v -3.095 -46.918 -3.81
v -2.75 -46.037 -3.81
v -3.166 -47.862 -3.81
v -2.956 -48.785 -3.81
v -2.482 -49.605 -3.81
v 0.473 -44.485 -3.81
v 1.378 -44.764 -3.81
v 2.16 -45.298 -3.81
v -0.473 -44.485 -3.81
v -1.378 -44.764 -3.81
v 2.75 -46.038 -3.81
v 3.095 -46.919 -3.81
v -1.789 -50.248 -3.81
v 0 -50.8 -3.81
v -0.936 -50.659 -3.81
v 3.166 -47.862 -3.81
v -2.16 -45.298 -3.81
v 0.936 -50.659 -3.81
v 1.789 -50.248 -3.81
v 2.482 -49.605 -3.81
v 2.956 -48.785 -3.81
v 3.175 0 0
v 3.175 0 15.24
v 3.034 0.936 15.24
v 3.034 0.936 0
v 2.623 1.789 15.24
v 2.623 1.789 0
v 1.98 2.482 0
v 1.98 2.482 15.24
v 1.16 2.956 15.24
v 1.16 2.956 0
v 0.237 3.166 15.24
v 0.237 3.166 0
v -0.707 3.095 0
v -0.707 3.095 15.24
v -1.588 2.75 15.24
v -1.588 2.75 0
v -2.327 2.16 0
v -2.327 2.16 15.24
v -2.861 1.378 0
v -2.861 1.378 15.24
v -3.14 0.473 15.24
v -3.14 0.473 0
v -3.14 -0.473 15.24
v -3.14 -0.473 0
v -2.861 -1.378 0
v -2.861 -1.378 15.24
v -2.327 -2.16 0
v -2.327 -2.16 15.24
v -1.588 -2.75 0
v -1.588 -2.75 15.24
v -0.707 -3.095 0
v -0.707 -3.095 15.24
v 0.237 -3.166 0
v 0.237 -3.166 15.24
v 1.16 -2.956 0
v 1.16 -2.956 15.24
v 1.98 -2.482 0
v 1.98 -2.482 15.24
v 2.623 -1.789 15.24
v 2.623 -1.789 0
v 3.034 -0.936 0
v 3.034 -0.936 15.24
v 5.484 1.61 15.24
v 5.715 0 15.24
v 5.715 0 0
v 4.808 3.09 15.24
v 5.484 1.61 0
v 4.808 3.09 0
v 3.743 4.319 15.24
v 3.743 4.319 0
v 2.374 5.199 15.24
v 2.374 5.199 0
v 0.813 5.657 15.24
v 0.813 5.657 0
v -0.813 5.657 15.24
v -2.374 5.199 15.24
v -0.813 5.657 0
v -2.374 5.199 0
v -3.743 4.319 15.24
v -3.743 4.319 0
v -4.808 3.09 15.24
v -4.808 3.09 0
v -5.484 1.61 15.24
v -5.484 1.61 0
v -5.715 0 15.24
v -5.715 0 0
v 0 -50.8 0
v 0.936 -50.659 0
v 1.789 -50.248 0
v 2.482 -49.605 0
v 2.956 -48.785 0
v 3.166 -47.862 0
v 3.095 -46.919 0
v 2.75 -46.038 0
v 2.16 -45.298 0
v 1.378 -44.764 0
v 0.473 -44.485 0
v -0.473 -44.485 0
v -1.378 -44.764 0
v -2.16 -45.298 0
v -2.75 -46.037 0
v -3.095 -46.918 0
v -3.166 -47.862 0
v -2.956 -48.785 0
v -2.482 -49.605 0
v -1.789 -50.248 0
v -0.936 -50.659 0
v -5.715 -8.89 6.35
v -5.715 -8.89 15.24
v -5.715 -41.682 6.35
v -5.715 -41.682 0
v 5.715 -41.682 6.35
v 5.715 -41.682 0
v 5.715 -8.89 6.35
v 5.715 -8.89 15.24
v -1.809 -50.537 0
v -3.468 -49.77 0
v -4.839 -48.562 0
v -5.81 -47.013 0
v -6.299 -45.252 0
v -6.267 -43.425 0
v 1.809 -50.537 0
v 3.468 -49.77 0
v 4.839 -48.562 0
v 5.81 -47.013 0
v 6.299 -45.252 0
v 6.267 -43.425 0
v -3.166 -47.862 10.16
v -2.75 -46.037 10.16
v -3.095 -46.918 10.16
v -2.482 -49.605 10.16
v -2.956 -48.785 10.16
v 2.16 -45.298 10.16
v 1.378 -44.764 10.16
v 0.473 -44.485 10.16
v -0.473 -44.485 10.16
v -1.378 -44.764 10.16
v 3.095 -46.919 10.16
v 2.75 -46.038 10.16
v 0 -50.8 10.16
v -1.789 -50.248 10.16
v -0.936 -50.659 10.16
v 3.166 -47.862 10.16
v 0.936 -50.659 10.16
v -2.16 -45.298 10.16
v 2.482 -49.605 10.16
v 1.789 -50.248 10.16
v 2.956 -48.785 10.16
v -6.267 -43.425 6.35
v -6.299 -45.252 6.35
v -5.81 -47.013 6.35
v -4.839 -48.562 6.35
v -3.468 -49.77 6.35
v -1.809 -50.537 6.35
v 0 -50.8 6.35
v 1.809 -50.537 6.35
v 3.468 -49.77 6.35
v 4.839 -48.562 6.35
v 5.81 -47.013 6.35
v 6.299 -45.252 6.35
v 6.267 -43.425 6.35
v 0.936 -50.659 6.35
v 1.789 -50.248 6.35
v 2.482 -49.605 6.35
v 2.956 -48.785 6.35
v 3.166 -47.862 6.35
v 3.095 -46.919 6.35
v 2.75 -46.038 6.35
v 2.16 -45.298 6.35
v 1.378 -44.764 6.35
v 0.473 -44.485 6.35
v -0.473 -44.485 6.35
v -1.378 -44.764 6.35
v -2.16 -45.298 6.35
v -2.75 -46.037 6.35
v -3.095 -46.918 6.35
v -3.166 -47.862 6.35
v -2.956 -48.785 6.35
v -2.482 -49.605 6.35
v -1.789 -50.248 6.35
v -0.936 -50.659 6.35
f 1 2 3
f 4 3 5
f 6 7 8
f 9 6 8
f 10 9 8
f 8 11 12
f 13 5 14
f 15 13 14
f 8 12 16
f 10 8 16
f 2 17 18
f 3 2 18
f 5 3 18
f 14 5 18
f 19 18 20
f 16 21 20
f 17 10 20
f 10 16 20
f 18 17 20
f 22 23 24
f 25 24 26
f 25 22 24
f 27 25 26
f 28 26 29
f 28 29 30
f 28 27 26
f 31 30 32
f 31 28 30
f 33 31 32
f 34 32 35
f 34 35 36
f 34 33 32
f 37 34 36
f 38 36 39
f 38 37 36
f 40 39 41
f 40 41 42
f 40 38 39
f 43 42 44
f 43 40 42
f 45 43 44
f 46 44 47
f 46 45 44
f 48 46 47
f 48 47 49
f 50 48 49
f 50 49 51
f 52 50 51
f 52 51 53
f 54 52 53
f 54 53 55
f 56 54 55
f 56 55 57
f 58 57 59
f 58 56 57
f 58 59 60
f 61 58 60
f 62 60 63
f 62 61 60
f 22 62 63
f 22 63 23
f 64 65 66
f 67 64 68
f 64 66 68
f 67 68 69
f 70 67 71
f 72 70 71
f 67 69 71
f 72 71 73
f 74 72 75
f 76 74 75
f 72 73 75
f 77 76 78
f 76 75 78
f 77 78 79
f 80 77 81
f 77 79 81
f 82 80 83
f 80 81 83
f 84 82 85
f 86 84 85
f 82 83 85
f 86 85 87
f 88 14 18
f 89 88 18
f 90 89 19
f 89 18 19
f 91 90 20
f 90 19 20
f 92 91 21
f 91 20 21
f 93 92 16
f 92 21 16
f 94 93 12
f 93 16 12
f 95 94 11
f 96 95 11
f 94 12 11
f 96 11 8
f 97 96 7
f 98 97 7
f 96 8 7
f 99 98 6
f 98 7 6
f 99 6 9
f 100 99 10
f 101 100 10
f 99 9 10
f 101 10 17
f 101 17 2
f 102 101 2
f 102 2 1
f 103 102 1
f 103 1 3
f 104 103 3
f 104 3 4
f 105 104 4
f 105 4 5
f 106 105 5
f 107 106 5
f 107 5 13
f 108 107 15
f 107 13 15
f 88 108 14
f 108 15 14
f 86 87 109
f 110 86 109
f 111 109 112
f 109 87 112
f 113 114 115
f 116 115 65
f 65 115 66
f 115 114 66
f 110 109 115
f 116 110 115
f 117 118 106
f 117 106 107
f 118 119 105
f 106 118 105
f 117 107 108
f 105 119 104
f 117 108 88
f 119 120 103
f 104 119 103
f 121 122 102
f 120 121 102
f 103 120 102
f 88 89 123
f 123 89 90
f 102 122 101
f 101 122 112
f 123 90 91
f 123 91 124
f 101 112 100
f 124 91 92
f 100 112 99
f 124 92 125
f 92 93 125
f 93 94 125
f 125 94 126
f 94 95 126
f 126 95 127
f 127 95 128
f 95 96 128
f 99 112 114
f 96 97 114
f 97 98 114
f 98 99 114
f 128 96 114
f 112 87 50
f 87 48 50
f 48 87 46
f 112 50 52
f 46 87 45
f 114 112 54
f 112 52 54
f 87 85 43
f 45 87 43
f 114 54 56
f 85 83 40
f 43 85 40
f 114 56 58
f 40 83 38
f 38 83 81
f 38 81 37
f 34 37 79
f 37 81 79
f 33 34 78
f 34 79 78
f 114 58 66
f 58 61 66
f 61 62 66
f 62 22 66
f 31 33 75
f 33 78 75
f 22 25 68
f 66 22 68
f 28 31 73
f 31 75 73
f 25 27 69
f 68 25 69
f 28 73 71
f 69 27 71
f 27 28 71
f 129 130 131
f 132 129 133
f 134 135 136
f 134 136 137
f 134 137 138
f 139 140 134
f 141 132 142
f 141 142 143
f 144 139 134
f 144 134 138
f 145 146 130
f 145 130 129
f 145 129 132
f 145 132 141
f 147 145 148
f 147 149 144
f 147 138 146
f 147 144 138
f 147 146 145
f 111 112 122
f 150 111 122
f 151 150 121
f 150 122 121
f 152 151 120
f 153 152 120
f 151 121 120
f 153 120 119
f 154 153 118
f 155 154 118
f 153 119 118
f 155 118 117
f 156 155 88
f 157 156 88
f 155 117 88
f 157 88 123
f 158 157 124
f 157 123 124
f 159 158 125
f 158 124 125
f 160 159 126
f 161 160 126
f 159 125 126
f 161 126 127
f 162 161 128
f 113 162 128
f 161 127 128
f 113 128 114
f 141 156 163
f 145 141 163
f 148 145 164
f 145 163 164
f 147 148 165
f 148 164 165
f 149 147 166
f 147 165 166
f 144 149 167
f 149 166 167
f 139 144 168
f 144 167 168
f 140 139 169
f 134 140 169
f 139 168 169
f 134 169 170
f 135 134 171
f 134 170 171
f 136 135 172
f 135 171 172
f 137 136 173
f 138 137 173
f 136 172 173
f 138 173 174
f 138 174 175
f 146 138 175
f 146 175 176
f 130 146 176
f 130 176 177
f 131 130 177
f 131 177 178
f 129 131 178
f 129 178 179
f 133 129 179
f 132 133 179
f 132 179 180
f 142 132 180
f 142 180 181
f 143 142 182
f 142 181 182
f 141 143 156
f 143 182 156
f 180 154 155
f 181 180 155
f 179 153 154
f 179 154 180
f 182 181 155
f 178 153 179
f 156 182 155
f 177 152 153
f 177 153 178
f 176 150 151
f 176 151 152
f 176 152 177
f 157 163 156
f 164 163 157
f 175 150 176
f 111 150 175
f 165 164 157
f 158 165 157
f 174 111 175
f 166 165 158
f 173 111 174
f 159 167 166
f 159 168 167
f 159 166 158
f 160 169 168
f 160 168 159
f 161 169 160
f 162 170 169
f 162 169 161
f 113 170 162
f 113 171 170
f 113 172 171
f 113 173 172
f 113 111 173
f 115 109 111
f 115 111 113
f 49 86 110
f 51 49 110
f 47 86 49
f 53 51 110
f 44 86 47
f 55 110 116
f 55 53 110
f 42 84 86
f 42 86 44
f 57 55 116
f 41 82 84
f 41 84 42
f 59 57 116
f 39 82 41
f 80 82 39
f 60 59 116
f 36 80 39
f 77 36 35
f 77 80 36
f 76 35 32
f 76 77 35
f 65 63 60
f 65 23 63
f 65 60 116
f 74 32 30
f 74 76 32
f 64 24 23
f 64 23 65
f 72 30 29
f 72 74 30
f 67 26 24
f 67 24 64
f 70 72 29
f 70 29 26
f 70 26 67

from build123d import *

# Parameters (mm, degrees)
SKETCH1_R           = 3.175
BOSS_EXTRUDE1_DEPTH = 6.35
SKETCH2_R           = 3.175
BOSS_EXTRUDE2_DEPTH = 3.81
BOSS_EXTRUDE3_START = -10.16
SKETCH2_2_R         = 3.175
BOSS_EXTRUDE3_DEPTH = 3.81
SKETCH4_R           = 3.175
BOSS_EXTRUDE4_DEPTH = 8.89


with BuildPart() as part:
    # Sketch1 → Boss-Extrude1 (new body)
    with BuildSketch(Plane.XY):
        with BuildLine():
            Line((-5.715, 0), (-5.715, -41.682099171))
            ThreePointArc((-5.715, -41.682099171), (0, -50.8), (5.715, -41.682099171))
            Line((5.715, -41.682099171), (5.715, 0))
            ThreePointArc((5.715, 0), (0, 5.715), (-5.715, 0))
        make_face()
        Circle(SKETCH1_R, mode=Mode.SUBTRACT)
    extrude(amount=BOSS_EXTRUDE1_DEPTH)

    # Sketch2 → Boss-Extrude2 (add)
    with BuildSketch(Plane.XY.offset(6.35)):
        with Locations(Location((0, -47.625, 0), (0, 0, 269.999356937))):
            Circle(SKETCH2_R)
    extrude(amount=BOSS_EXTRUDE2_DEPTH)

    # Sketch2<2> → Boss-Extrude3 (add)
    with BuildSketch(Plane.XY.offset(6.35).offset(BOSS_EXTRUDE3_START)):
        with Locations(Location((0, -47.625, 0), (0, 0, 269.999356937))):
            Circle(SKETCH2_2_R)
    extrude(amount=BOSS_EXTRUDE3_DEPTH)

    # Sketch4 → Boss-Extrude4 (add)
    with BuildSketch(Plane.XY.offset(6.35)):
        with BuildLine():
            Line((-5.715, -8.89), (5.715, -8.89))
            Line((5.715, -8.89), (5.715, 0))
            ThreePointArc((5.715, 0), (0, 5.715), (-5.715, 0))
            Line((-5.715, 0), (-5.715, -8.89))
        make_face()
        Circle(SKETCH4_R, mode=Mode.SUBTRACT)
    extrude(amount=BOSS_EXTRUDE4_DEPTH)


solid = part.part
